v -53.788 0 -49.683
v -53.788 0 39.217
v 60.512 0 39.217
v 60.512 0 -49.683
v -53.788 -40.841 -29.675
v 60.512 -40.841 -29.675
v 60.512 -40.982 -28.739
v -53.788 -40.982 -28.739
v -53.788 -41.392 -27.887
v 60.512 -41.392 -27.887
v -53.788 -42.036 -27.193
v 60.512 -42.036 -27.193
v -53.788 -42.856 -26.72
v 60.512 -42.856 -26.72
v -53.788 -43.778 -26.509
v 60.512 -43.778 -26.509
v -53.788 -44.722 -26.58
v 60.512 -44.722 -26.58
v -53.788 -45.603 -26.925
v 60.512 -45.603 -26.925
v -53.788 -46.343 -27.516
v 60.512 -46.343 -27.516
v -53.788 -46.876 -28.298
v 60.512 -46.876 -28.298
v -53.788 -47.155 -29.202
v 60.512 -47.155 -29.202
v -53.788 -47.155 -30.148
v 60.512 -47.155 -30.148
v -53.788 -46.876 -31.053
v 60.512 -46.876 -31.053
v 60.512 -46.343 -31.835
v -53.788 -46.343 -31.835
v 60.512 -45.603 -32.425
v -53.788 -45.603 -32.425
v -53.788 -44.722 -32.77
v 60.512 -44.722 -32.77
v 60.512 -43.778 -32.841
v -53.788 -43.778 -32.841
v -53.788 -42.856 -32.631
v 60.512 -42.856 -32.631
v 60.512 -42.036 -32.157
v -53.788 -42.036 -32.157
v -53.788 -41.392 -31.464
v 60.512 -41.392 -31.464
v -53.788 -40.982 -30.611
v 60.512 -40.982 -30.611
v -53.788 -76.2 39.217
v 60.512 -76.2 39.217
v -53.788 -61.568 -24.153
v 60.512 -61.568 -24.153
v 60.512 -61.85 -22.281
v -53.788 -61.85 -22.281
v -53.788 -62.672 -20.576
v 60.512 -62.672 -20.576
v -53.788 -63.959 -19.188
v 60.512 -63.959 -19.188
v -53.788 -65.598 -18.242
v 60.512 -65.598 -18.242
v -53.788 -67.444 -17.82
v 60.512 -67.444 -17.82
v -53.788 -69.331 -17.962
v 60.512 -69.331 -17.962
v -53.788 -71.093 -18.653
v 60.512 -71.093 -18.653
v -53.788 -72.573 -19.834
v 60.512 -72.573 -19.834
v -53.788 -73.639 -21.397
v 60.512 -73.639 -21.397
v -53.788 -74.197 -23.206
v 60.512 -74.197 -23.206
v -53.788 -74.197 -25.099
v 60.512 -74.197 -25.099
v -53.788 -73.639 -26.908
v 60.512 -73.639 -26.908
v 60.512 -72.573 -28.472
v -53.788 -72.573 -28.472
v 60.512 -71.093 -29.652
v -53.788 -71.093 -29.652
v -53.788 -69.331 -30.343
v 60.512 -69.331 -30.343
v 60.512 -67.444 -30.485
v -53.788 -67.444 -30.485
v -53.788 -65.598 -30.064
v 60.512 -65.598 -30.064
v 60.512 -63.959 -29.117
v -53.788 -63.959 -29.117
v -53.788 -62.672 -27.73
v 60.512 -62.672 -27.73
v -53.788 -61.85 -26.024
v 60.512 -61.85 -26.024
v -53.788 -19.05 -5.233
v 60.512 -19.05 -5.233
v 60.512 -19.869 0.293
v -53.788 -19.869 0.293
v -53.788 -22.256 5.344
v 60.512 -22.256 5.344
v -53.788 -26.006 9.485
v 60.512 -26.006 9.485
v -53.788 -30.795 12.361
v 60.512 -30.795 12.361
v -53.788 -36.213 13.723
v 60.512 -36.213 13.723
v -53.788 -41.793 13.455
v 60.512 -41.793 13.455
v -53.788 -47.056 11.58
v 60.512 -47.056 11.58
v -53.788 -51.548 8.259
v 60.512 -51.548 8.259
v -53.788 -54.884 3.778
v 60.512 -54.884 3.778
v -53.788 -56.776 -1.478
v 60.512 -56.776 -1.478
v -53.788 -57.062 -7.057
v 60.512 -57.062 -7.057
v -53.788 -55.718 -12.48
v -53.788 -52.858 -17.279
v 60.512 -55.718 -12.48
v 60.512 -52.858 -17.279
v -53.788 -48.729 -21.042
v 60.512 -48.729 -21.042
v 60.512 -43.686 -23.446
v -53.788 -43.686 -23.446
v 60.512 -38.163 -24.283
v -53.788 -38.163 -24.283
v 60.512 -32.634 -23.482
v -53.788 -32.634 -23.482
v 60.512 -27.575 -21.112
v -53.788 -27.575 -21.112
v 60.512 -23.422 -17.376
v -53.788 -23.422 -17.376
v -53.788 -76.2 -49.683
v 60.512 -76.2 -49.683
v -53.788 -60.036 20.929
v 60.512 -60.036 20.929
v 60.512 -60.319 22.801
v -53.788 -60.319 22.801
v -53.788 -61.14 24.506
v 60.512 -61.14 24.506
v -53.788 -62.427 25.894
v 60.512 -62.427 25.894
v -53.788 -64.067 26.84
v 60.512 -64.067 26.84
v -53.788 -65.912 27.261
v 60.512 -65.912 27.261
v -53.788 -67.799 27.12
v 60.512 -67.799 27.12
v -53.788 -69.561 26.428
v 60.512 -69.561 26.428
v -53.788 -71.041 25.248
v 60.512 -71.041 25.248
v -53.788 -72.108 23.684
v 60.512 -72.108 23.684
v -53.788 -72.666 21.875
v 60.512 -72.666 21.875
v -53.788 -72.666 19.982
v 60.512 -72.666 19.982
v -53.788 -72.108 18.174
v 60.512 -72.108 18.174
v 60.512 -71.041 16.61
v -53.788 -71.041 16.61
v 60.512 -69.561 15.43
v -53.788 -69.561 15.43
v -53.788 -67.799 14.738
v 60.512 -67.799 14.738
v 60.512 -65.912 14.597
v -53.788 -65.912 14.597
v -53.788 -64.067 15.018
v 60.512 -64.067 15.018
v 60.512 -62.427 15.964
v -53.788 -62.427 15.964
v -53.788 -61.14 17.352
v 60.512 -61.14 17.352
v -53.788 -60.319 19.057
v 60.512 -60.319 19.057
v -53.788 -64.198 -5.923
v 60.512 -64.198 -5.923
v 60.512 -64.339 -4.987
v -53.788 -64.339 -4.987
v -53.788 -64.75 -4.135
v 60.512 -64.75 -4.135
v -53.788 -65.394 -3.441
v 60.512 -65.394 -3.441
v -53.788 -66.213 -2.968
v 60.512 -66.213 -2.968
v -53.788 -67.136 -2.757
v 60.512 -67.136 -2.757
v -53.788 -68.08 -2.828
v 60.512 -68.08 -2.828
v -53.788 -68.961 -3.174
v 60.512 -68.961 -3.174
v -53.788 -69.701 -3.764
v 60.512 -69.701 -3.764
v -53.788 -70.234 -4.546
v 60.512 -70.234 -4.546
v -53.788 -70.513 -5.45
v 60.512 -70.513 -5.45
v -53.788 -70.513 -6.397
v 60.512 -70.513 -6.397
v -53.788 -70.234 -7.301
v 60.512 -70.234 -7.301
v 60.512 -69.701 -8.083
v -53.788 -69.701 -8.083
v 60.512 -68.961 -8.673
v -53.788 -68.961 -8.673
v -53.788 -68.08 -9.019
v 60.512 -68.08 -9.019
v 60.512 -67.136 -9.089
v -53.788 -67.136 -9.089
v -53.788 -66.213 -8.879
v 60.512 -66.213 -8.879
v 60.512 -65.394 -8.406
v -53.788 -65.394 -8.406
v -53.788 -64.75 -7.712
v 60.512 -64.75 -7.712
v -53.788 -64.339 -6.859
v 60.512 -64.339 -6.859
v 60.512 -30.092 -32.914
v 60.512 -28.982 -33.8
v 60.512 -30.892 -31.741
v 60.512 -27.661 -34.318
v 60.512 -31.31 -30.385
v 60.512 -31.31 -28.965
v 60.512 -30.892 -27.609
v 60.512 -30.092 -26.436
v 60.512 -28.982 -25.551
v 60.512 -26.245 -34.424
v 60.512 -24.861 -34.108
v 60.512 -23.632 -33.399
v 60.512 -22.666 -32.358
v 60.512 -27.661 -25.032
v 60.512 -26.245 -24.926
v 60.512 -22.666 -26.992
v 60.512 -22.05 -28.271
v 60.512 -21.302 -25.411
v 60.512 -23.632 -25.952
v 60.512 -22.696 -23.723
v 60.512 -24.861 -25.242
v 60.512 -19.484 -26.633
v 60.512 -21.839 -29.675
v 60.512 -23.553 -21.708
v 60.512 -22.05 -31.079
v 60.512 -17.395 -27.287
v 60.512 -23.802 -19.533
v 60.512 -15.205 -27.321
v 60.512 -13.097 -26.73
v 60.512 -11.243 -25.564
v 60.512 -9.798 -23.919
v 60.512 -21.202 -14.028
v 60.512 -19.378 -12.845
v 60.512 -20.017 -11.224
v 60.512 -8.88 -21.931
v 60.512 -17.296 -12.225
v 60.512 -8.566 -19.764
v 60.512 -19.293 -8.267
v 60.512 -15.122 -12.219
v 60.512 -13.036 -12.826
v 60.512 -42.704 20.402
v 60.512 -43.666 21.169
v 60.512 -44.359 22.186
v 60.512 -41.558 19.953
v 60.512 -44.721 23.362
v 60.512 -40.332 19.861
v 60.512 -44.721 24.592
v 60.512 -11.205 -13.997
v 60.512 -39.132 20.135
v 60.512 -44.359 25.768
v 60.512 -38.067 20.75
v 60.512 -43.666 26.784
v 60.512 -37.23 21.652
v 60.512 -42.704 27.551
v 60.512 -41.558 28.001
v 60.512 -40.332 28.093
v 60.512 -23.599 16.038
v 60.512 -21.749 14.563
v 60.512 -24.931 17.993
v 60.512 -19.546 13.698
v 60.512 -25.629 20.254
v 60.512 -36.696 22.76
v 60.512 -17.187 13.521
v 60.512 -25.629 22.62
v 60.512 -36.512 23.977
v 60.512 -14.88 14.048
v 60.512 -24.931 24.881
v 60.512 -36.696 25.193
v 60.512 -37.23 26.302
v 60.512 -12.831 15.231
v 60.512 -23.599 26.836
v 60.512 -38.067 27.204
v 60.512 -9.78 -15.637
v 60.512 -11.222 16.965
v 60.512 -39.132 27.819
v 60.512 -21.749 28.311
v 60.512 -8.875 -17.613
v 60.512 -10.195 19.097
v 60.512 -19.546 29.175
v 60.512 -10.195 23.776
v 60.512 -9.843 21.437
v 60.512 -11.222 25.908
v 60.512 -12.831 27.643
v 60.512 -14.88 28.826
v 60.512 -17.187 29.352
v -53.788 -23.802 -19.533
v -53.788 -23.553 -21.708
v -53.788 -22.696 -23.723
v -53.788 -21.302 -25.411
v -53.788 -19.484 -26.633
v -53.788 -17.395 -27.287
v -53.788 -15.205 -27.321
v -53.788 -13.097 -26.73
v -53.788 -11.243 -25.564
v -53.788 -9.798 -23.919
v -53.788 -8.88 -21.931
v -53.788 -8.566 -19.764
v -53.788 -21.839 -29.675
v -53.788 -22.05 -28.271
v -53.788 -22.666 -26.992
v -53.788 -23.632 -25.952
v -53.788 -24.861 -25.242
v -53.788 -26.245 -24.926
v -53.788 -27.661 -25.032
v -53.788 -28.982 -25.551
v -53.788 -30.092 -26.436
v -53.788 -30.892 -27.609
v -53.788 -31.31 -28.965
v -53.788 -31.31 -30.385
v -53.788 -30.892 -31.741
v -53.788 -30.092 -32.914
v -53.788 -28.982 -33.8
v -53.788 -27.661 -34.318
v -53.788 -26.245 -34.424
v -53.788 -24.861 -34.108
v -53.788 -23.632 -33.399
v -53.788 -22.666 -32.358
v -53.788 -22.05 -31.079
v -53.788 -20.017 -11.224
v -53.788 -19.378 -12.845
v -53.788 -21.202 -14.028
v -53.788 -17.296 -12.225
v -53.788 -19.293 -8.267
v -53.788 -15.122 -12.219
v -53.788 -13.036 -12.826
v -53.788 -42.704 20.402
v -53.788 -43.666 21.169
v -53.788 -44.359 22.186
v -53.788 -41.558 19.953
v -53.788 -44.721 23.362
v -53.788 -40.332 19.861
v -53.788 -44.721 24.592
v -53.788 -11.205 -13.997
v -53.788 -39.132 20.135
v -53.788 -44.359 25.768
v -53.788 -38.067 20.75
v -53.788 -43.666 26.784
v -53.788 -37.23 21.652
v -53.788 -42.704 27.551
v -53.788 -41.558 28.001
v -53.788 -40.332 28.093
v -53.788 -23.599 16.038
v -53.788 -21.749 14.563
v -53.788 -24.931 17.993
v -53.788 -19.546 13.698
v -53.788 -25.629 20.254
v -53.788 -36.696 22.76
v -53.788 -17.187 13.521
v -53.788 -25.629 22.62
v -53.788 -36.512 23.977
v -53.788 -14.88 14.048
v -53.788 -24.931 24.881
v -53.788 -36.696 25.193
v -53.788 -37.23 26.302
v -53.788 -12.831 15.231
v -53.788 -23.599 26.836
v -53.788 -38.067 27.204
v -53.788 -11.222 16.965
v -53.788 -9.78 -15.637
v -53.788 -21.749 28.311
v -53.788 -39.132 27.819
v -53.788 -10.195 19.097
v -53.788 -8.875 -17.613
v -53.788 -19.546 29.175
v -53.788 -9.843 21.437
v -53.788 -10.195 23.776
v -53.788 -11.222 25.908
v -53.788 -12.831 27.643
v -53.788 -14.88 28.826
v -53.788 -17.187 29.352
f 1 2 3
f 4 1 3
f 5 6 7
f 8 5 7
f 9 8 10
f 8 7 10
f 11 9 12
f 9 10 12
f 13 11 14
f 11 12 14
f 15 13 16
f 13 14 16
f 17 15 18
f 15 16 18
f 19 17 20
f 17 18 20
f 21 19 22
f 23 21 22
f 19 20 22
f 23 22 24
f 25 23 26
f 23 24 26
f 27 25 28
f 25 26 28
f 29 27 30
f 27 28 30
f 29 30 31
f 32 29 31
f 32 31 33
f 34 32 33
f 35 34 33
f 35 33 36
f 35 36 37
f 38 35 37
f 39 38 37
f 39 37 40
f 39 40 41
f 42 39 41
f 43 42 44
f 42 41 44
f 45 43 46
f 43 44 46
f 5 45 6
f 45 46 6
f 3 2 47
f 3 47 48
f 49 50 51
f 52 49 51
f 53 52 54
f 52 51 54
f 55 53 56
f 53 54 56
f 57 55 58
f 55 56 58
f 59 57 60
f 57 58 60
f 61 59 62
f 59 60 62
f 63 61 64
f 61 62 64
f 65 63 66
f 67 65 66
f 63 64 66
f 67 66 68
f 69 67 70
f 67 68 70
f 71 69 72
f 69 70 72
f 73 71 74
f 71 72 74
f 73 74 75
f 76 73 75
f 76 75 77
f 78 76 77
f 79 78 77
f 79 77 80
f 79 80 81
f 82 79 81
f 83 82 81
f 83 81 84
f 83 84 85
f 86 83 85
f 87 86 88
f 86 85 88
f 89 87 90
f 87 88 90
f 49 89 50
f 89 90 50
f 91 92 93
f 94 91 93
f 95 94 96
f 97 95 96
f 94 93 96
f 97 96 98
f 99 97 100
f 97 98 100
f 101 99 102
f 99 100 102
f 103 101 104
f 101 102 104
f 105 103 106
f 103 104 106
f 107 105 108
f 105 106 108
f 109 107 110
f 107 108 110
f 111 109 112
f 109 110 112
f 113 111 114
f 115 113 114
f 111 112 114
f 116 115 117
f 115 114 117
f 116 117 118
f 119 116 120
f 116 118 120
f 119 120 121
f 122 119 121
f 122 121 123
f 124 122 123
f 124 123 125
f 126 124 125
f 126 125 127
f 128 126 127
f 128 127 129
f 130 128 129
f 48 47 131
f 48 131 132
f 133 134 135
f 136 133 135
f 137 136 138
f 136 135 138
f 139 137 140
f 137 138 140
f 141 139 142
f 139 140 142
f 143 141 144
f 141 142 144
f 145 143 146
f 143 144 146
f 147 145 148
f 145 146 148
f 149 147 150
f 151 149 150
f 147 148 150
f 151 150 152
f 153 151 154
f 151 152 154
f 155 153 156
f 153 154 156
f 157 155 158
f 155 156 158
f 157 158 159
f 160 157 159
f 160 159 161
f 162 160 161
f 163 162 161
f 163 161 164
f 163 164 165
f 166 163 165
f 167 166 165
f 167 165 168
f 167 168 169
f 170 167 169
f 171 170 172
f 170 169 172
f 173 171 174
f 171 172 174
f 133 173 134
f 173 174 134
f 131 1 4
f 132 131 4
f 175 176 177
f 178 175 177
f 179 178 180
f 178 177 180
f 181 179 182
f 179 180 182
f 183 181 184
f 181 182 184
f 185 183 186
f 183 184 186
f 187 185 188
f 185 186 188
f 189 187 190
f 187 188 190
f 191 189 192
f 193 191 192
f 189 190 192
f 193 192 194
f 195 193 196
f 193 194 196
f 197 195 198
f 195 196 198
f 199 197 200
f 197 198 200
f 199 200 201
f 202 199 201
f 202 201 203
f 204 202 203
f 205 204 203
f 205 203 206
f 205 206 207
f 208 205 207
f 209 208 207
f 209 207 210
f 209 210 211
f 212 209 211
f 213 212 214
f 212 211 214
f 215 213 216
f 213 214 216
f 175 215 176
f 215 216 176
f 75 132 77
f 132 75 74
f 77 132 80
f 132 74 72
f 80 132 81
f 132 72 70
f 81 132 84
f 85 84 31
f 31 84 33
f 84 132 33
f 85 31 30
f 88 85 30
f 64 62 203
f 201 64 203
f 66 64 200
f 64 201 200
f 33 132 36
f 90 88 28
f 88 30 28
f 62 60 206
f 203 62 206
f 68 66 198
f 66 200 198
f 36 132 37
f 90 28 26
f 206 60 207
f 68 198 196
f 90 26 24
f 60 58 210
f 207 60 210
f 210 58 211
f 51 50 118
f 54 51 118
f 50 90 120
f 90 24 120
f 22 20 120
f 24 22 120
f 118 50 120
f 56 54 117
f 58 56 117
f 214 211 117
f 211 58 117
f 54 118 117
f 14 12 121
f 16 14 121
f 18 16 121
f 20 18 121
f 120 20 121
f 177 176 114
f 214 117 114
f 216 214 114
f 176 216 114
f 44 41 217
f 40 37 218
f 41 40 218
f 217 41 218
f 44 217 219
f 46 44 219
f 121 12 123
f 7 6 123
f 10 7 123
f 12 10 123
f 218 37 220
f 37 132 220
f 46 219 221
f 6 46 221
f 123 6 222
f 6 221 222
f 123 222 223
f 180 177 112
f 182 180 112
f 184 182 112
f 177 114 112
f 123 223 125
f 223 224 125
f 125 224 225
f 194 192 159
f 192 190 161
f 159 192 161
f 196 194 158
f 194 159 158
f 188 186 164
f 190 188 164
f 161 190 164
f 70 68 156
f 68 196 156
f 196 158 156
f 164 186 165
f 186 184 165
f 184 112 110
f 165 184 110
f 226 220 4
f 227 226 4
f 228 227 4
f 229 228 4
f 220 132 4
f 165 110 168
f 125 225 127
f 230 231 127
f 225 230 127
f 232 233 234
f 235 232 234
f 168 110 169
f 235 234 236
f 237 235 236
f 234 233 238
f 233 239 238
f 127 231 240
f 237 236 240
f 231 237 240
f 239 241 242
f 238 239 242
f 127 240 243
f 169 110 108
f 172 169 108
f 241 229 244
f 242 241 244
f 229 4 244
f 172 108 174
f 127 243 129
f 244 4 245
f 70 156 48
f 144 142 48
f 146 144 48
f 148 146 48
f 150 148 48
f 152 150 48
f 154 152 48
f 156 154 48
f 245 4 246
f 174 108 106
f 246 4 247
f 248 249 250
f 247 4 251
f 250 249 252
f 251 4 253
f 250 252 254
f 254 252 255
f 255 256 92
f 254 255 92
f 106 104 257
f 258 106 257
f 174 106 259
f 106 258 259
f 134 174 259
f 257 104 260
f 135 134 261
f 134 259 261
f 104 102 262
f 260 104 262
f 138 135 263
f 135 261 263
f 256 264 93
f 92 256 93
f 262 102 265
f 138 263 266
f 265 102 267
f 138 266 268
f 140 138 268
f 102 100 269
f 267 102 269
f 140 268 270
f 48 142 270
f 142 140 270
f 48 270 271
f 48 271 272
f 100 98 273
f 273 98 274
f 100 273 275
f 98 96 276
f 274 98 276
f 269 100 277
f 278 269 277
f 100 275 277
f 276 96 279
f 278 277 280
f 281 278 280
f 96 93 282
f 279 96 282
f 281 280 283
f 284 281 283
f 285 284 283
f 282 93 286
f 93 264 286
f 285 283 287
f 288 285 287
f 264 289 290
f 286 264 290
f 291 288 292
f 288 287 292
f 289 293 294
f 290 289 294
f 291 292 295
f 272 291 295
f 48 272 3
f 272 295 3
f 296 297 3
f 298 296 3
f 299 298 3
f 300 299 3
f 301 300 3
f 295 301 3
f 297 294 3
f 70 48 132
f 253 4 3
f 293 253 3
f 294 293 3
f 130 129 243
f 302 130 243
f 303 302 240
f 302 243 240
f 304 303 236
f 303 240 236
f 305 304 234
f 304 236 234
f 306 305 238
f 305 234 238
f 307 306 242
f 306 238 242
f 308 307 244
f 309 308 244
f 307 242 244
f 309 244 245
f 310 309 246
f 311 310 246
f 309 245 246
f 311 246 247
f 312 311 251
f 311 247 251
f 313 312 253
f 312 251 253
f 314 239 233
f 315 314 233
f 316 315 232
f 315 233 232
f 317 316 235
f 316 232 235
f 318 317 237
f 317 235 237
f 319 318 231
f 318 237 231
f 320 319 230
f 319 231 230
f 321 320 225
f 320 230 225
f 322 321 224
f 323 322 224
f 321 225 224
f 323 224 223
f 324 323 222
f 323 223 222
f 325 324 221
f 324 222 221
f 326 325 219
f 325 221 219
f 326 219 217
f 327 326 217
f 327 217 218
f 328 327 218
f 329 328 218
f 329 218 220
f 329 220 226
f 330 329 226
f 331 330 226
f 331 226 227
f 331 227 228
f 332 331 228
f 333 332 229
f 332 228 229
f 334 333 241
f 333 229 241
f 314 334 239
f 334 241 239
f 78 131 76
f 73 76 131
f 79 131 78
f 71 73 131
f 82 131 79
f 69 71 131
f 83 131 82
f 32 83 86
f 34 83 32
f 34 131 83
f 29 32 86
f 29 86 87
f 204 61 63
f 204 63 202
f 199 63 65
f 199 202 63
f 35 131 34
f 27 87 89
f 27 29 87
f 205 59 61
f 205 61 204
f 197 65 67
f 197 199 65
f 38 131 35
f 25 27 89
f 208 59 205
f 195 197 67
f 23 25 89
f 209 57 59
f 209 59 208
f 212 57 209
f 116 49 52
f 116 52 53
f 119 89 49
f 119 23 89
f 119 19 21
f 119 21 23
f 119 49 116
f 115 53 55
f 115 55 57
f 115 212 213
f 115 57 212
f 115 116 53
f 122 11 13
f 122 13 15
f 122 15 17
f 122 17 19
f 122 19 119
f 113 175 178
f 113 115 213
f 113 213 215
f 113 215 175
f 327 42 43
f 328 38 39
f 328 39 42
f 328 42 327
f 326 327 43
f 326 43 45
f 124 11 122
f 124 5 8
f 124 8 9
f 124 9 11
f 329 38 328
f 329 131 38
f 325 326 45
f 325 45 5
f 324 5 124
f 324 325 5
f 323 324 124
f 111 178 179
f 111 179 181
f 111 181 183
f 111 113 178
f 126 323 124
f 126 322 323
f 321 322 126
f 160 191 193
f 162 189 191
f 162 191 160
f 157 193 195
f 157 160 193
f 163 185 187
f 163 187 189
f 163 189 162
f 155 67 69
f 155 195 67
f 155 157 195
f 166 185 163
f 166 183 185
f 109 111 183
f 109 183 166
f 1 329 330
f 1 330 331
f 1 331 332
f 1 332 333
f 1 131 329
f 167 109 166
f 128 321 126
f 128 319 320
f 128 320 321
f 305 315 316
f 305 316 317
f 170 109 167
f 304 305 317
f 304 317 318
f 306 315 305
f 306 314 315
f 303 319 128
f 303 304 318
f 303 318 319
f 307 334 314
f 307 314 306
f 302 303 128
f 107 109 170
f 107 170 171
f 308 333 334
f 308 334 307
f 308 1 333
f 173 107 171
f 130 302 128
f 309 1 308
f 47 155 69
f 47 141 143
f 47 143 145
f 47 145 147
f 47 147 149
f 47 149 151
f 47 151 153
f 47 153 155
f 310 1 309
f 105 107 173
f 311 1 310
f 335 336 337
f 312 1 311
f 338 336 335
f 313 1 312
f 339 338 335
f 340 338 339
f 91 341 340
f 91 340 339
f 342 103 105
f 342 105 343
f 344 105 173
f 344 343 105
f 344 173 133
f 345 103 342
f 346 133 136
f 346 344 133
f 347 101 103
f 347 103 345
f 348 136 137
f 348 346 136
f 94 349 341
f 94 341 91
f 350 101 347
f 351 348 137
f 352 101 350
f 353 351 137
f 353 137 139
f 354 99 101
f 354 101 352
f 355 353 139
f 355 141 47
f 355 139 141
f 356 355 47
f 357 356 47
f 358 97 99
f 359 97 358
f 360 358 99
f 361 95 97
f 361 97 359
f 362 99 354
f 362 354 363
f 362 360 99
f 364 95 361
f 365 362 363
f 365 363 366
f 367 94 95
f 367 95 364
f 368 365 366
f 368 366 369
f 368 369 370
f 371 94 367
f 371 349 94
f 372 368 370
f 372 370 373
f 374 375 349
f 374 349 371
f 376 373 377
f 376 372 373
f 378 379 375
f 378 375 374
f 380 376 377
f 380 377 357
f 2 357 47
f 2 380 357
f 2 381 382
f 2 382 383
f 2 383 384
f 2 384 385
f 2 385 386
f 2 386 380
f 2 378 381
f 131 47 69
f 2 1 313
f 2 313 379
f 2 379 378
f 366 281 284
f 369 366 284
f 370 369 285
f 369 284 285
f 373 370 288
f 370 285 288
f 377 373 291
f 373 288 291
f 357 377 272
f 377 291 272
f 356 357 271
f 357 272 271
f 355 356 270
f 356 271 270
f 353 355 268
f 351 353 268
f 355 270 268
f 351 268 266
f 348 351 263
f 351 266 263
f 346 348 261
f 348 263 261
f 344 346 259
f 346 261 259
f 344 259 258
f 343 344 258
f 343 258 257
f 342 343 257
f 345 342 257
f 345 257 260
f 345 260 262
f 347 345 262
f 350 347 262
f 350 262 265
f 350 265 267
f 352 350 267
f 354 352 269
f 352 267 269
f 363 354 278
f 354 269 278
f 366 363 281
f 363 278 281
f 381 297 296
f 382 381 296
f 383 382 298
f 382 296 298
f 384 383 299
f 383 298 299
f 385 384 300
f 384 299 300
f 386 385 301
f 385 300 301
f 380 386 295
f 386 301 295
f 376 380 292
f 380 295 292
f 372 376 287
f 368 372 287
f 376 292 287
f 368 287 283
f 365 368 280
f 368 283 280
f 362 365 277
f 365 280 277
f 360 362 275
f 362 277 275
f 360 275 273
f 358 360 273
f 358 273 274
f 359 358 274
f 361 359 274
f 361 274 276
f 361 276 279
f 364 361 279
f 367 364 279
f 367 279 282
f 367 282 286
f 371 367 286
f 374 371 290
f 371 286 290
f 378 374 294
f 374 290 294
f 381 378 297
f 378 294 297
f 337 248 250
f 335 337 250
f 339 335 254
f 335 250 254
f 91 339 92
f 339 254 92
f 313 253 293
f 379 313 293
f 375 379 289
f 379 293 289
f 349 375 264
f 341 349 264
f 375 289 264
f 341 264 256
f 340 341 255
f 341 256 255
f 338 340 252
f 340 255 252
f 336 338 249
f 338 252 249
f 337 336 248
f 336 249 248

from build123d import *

# Parameters (mm, degrees)
F0_W     = 114.3
F0_H     = 88.9
F1_DEPTH = 76.2
F2_R     = 6.35
F2_R_2   = 7.9375
F2_R_3   = 3.175
F2_R_4   = 4.1275
F2_R_5   = 4.7625
F3_DEPTH = 114.3


with BuildPart() as f1:
    # F0 (on Front) → F1 (new body)
    with BuildSketch(Plane.XZ):
        with Locations((3.3618031452, -5.2332123742)):
            Rectangle(F0_W, F0_H)
    extrude(amount=F1_DEPTH)

    # F2 (on face) → F3 (cut, through all)
    with BuildSketch(Plane.YZ.offset(60.5118031452)):
        with BuildLine():
            ThreePointArc((-21.2015970146, -14.027896936), (-19.5957156735, -9.7602380604), (-19.05, -5.2332123742))
            ThreePointArc((-19.05, -5.2332123742), (-56.0237840544, 1.2197299913), (-23.4217023803, -17.3761147861))
            ThreePointArc((-23.4217023803, -17.3761147861), (-22.5362767831, -15.5530622079), (-21.2015970146, -14.027896936))
        make_face()
        with BuildLine():
            ThreePointArc((-21.2015970146, -14.027896936), (-22.5362767831, -15.5530622079), (-23.4217023803, -17.3761147861))
            ThreePointArc((-23.4217023803, -17.3761147861), (-22.2231411807, -15.7606932709), (-21.2015970146, -14.027896936))
        make_face()
        with BuildLine():
            ThreePointArc((-21.2015970146, -14.027896936), (-22.2231411807, -15.7606932709), (-23.4217023803, -17.3761147861))
            ThreePointArc((-23.4217023803, -17.3761147861), (-17.3948287668, -27.2874849256), (-8.5655332553, -19.7640545666))
            ThreePointArc((-8.5655332553, -19.7640545666), (-13.0357718235, -12.82550984), (-21.2015970146, -14.027896936))
        make_face()
        with Locations((-66.3864538074, 20.9288746119)):
            Circle(F2_R)
        with Locations((-17.78, 21.4367876258)):
            Circle(F2_R_2)
        with Locations((-67.9182708263, -24.1526439786)):
            Circle(F2_R)
        with Locations((-67.3732608557, -5.9233275242)):
            Circle(F2_R_3)
        with Locations((-44.0157242119, -29.6750832349)):
            Circle(F2_R_3)
        with Locations((-40.64, 23.9767876258)):
            Circle(F2_R_4)
        with Locations((-26.6011171043, -29.6750832349)):
            Circle(F2_R_5)
    extrude(amount=-F3_DEPTH, mode=Mode.SUBTRACT)


solid = f1.part
